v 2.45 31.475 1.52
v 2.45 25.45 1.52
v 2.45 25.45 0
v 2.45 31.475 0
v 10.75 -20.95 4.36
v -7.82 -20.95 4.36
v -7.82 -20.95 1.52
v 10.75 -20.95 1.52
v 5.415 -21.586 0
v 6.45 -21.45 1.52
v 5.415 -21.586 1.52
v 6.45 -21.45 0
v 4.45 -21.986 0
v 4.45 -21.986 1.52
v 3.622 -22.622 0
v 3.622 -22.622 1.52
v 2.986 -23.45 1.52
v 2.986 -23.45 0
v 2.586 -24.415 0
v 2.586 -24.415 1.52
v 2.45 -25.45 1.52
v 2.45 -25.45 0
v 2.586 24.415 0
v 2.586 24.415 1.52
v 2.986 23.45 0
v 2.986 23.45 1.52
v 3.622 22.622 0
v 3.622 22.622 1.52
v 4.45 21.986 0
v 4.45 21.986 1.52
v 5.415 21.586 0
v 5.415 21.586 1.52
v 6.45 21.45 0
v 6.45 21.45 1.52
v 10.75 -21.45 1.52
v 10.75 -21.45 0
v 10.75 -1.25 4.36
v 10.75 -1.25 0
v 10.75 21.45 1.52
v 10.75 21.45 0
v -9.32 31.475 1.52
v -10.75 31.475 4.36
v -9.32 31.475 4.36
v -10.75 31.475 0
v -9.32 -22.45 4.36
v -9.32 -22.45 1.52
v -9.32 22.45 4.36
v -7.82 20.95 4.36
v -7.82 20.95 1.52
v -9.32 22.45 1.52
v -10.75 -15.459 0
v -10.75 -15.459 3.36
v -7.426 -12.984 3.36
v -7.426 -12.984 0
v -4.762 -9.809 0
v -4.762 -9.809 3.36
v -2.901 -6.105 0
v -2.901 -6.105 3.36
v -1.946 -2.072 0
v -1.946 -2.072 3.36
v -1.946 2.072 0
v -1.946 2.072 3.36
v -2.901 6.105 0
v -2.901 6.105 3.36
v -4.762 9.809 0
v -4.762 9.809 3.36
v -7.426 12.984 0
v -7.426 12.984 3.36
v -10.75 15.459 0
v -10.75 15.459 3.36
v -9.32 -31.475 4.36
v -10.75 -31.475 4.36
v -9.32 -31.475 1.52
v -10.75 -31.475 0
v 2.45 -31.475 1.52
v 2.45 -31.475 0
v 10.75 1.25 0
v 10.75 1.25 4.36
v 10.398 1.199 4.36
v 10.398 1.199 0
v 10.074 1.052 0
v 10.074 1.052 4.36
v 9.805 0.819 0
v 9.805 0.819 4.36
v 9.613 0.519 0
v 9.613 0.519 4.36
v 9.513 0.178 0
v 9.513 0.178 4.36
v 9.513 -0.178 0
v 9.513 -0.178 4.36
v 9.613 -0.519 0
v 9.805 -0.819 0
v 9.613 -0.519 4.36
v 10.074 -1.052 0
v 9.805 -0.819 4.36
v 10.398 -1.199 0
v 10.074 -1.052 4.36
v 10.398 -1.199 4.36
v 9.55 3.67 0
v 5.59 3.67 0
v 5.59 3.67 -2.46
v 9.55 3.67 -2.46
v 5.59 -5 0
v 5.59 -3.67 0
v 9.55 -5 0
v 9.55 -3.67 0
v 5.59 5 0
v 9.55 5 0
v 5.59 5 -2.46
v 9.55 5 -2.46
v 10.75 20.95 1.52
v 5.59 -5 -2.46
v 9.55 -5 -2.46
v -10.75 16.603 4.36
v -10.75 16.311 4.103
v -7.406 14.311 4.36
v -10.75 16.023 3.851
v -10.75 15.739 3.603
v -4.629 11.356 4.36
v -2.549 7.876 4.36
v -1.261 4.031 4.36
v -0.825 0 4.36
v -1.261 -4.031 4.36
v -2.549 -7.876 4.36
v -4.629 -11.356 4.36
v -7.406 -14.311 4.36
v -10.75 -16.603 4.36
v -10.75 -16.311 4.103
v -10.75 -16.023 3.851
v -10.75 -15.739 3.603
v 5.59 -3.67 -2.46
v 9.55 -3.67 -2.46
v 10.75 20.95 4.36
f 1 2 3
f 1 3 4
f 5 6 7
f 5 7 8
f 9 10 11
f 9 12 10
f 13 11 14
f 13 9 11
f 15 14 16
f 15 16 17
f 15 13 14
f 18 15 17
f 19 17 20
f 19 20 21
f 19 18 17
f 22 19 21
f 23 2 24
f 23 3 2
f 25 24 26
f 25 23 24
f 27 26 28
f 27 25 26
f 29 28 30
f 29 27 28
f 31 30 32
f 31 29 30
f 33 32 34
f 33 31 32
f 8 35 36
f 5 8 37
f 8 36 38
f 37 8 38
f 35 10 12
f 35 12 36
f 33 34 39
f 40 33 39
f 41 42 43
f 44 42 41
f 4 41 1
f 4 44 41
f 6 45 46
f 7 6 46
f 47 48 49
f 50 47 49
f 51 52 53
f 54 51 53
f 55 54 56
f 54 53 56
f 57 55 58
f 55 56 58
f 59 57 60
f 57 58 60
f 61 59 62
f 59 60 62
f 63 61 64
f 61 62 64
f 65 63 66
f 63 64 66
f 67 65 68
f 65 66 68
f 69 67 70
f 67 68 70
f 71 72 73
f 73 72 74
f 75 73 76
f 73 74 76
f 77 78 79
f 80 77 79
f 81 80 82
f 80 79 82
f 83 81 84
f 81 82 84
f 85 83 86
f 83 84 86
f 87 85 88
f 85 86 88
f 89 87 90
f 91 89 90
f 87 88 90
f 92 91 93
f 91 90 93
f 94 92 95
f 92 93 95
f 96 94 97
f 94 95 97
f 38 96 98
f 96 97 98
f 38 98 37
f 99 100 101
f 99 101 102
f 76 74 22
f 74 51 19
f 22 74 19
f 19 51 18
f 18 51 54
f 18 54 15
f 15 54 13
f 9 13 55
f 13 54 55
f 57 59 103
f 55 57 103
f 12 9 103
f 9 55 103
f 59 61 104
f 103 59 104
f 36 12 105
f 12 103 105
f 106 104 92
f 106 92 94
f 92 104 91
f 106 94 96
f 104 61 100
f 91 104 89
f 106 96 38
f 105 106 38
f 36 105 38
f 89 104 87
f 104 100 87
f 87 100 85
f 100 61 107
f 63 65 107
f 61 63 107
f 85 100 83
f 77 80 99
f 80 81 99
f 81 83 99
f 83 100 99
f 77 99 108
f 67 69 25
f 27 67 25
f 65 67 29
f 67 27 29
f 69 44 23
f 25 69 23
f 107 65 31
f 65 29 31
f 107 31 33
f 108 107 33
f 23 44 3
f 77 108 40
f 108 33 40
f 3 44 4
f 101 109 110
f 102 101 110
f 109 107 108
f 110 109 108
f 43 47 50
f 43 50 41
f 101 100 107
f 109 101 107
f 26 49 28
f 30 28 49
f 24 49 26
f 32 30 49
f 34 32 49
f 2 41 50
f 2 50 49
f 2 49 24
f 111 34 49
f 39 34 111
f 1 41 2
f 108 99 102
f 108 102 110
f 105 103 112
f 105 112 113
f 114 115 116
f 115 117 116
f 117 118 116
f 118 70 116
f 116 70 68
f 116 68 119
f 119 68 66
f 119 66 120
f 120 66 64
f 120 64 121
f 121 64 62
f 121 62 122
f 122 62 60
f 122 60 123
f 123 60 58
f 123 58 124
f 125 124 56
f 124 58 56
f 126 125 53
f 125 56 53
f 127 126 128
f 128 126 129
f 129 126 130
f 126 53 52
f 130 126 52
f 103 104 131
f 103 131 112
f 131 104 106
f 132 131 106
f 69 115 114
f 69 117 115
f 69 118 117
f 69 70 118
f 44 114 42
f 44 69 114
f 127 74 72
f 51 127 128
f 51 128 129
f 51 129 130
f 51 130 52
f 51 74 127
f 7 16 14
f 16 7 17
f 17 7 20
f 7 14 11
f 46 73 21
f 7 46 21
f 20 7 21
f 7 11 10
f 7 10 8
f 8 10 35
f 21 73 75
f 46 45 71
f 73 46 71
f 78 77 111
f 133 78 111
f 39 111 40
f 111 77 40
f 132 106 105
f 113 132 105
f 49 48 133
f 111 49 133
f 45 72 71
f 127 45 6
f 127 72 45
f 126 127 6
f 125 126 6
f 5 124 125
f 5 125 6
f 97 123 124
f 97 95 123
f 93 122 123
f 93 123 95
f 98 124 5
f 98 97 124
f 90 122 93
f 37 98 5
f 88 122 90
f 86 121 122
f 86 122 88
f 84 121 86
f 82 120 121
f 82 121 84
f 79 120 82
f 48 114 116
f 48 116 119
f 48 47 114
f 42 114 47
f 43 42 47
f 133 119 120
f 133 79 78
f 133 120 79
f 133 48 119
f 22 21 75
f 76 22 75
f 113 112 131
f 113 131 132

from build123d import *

# Parameters (mm, degrees)
SKETCH_W        = 21.5
SKETCH_H        = 62.95
PAD_DEPTH       = 4.36
SKETCH001_W     = 3.96
SKETCH001_H     = 1.33
PAD001_DEPTH    = 2.46
SKETCH002_W     = 40.406182
SKETCH002_H     = 15.340348
POCKET_DEPTH    = 2.84
CHAMFER_SIZE    = 1.5
CHAMFER001_SIZE = 1.5
SKETCH003_R     = 1.25
POCKET001_DEPTH = 6.821
SKETCH004_R     = 17.85
POCKET002_DEPTH = 5
CHAMFER002_SIZE = 1
SKETCH005_W     = 26.6657
SKETCH005_H     = 14.870099
POCKET003_DEPTH = 5
FILLET_R        = 4
FILLET001_R     = 4


with BuildPart() as part:
    # Sketch → Pad (new body)
    with BuildSketch(Plane.XY):
        Rectangle(SKETCH_W, SKETCH_H)
    extrude(amount=PAD_DEPTH)

    # Sketch001 → Pad001 (join)
    with BuildSketch(Plane.XY):
        with Locations((7.57, 4.335)):
            Rectangle(SKETCH001_W, SKETCH001_H)
    pad001 = extrude(amount=-PAD001_DEPTH)

    # Mirrored: Pad001 across Sketch001 H_Axis
    add(pad001.mirror(Plane.ZX))

    # Sketch002 (on Face5 of Mirrored) → Pocket (cut)
    with BuildSketch(Plane.XY.offset(4.36)):
        with Locations((10.883091, 28.620174)):
            Rectangle(SKETCH002_W, SKETCH002_H)
    pocket = extrude(amount=-POCKET_DEPTH, mode=Mode.SUBTRACT)

    # Chamfer
    chamfer_edges = [part.edges().sort_by_distance(p)[0] for p in [
        (-9.32, 20.95, 2.94),
    ]]
    chamfer(chamfer_edges, length=CHAMFER_SIZE)

    # Mirrored001: Pocket across Sketch002 H_Axis
    add(pocket.mirror(Plane(origin=(0, 0, 4.36), x_dir=(0, 0, 1), z_dir=(0, 1, 0))), mode=Mode.SUBTRACT)

    # Chamfer001
    chamfer001_edges = [part.edges().sort_by_distance(p)[0] for p in [
        (-9.32, -20.95, 2.94),
    ]]
    chamfer(chamfer001_edges, length=CHAMFER001_SIZE)

    # Sketch003 (on Face1 of Chamfer001) → Pocket001 (cut, through all)
    with BuildSketch(Plane.XY.offset(4.36)):
        with Locations((10.75, 0)):
            Circle(SKETCH003_R)
    extrude(amount=-POCKET001_DEPTH, mode=Mode.SUBTRACT)

    # Sketch004 (on Face1 of Pocket001) → Pocket002 (cut)
    with BuildSketch(Plane.XY.offset(4.36)):
        with Locations((-19.675, 0)):
            Circle(SKETCH004_R)
    extrude(amount=-POCKET002_DEPTH, mode=Mode.SUBTRACT)

    # Chamfer002
    chamfer002_edges = [part.edges().sort_by_distance(p)[0] for p in [
        (-4.216447, 8.925, 4.36),
        (-4.216447, -8.925, 4.36),
    ]]
    chamfer(chamfer002_edges, length=CHAMFER002_SIZE)

    # Sketch005 (on Face19 of Chamfer002) → Pocket003 (cut)
    with BuildSketch(Plane.XY.offset(1.52)):
        with Locations((15.78285, 28.88505)):
            Rectangle(SKETCH005_W, SKETCH005_H)
    pocket003 = extrude(amount=-POCKET003_DEPTH, mode=Mode.SUBTRACT)

    # Fillet
    fillet_edges = [part.edges().sort_by_distance(p)[0] for p in [
        (2.45, 21.45, 0.76),
    ]]
    fillet(fillet_edges, radius=FILLET_R)

    # Mirrored002: Pocket003 across Sketch005 H_Axis
    add(pocket003.mirror(Plane(origin=(0, 0, 1.52), x_dir=(0, 0, 1), z_dir=(0, 1, 0))), mode=Mode.SUBTRACT)

    # Fillet001
    fillet001_edges = [part.edges().sort_by_distance(p)[0] for p in [
        (2.45, -21.45, 0.76),
    ]]
    fillet(fillet001_edges, radius=FILLET001_R)


solid = part.part
